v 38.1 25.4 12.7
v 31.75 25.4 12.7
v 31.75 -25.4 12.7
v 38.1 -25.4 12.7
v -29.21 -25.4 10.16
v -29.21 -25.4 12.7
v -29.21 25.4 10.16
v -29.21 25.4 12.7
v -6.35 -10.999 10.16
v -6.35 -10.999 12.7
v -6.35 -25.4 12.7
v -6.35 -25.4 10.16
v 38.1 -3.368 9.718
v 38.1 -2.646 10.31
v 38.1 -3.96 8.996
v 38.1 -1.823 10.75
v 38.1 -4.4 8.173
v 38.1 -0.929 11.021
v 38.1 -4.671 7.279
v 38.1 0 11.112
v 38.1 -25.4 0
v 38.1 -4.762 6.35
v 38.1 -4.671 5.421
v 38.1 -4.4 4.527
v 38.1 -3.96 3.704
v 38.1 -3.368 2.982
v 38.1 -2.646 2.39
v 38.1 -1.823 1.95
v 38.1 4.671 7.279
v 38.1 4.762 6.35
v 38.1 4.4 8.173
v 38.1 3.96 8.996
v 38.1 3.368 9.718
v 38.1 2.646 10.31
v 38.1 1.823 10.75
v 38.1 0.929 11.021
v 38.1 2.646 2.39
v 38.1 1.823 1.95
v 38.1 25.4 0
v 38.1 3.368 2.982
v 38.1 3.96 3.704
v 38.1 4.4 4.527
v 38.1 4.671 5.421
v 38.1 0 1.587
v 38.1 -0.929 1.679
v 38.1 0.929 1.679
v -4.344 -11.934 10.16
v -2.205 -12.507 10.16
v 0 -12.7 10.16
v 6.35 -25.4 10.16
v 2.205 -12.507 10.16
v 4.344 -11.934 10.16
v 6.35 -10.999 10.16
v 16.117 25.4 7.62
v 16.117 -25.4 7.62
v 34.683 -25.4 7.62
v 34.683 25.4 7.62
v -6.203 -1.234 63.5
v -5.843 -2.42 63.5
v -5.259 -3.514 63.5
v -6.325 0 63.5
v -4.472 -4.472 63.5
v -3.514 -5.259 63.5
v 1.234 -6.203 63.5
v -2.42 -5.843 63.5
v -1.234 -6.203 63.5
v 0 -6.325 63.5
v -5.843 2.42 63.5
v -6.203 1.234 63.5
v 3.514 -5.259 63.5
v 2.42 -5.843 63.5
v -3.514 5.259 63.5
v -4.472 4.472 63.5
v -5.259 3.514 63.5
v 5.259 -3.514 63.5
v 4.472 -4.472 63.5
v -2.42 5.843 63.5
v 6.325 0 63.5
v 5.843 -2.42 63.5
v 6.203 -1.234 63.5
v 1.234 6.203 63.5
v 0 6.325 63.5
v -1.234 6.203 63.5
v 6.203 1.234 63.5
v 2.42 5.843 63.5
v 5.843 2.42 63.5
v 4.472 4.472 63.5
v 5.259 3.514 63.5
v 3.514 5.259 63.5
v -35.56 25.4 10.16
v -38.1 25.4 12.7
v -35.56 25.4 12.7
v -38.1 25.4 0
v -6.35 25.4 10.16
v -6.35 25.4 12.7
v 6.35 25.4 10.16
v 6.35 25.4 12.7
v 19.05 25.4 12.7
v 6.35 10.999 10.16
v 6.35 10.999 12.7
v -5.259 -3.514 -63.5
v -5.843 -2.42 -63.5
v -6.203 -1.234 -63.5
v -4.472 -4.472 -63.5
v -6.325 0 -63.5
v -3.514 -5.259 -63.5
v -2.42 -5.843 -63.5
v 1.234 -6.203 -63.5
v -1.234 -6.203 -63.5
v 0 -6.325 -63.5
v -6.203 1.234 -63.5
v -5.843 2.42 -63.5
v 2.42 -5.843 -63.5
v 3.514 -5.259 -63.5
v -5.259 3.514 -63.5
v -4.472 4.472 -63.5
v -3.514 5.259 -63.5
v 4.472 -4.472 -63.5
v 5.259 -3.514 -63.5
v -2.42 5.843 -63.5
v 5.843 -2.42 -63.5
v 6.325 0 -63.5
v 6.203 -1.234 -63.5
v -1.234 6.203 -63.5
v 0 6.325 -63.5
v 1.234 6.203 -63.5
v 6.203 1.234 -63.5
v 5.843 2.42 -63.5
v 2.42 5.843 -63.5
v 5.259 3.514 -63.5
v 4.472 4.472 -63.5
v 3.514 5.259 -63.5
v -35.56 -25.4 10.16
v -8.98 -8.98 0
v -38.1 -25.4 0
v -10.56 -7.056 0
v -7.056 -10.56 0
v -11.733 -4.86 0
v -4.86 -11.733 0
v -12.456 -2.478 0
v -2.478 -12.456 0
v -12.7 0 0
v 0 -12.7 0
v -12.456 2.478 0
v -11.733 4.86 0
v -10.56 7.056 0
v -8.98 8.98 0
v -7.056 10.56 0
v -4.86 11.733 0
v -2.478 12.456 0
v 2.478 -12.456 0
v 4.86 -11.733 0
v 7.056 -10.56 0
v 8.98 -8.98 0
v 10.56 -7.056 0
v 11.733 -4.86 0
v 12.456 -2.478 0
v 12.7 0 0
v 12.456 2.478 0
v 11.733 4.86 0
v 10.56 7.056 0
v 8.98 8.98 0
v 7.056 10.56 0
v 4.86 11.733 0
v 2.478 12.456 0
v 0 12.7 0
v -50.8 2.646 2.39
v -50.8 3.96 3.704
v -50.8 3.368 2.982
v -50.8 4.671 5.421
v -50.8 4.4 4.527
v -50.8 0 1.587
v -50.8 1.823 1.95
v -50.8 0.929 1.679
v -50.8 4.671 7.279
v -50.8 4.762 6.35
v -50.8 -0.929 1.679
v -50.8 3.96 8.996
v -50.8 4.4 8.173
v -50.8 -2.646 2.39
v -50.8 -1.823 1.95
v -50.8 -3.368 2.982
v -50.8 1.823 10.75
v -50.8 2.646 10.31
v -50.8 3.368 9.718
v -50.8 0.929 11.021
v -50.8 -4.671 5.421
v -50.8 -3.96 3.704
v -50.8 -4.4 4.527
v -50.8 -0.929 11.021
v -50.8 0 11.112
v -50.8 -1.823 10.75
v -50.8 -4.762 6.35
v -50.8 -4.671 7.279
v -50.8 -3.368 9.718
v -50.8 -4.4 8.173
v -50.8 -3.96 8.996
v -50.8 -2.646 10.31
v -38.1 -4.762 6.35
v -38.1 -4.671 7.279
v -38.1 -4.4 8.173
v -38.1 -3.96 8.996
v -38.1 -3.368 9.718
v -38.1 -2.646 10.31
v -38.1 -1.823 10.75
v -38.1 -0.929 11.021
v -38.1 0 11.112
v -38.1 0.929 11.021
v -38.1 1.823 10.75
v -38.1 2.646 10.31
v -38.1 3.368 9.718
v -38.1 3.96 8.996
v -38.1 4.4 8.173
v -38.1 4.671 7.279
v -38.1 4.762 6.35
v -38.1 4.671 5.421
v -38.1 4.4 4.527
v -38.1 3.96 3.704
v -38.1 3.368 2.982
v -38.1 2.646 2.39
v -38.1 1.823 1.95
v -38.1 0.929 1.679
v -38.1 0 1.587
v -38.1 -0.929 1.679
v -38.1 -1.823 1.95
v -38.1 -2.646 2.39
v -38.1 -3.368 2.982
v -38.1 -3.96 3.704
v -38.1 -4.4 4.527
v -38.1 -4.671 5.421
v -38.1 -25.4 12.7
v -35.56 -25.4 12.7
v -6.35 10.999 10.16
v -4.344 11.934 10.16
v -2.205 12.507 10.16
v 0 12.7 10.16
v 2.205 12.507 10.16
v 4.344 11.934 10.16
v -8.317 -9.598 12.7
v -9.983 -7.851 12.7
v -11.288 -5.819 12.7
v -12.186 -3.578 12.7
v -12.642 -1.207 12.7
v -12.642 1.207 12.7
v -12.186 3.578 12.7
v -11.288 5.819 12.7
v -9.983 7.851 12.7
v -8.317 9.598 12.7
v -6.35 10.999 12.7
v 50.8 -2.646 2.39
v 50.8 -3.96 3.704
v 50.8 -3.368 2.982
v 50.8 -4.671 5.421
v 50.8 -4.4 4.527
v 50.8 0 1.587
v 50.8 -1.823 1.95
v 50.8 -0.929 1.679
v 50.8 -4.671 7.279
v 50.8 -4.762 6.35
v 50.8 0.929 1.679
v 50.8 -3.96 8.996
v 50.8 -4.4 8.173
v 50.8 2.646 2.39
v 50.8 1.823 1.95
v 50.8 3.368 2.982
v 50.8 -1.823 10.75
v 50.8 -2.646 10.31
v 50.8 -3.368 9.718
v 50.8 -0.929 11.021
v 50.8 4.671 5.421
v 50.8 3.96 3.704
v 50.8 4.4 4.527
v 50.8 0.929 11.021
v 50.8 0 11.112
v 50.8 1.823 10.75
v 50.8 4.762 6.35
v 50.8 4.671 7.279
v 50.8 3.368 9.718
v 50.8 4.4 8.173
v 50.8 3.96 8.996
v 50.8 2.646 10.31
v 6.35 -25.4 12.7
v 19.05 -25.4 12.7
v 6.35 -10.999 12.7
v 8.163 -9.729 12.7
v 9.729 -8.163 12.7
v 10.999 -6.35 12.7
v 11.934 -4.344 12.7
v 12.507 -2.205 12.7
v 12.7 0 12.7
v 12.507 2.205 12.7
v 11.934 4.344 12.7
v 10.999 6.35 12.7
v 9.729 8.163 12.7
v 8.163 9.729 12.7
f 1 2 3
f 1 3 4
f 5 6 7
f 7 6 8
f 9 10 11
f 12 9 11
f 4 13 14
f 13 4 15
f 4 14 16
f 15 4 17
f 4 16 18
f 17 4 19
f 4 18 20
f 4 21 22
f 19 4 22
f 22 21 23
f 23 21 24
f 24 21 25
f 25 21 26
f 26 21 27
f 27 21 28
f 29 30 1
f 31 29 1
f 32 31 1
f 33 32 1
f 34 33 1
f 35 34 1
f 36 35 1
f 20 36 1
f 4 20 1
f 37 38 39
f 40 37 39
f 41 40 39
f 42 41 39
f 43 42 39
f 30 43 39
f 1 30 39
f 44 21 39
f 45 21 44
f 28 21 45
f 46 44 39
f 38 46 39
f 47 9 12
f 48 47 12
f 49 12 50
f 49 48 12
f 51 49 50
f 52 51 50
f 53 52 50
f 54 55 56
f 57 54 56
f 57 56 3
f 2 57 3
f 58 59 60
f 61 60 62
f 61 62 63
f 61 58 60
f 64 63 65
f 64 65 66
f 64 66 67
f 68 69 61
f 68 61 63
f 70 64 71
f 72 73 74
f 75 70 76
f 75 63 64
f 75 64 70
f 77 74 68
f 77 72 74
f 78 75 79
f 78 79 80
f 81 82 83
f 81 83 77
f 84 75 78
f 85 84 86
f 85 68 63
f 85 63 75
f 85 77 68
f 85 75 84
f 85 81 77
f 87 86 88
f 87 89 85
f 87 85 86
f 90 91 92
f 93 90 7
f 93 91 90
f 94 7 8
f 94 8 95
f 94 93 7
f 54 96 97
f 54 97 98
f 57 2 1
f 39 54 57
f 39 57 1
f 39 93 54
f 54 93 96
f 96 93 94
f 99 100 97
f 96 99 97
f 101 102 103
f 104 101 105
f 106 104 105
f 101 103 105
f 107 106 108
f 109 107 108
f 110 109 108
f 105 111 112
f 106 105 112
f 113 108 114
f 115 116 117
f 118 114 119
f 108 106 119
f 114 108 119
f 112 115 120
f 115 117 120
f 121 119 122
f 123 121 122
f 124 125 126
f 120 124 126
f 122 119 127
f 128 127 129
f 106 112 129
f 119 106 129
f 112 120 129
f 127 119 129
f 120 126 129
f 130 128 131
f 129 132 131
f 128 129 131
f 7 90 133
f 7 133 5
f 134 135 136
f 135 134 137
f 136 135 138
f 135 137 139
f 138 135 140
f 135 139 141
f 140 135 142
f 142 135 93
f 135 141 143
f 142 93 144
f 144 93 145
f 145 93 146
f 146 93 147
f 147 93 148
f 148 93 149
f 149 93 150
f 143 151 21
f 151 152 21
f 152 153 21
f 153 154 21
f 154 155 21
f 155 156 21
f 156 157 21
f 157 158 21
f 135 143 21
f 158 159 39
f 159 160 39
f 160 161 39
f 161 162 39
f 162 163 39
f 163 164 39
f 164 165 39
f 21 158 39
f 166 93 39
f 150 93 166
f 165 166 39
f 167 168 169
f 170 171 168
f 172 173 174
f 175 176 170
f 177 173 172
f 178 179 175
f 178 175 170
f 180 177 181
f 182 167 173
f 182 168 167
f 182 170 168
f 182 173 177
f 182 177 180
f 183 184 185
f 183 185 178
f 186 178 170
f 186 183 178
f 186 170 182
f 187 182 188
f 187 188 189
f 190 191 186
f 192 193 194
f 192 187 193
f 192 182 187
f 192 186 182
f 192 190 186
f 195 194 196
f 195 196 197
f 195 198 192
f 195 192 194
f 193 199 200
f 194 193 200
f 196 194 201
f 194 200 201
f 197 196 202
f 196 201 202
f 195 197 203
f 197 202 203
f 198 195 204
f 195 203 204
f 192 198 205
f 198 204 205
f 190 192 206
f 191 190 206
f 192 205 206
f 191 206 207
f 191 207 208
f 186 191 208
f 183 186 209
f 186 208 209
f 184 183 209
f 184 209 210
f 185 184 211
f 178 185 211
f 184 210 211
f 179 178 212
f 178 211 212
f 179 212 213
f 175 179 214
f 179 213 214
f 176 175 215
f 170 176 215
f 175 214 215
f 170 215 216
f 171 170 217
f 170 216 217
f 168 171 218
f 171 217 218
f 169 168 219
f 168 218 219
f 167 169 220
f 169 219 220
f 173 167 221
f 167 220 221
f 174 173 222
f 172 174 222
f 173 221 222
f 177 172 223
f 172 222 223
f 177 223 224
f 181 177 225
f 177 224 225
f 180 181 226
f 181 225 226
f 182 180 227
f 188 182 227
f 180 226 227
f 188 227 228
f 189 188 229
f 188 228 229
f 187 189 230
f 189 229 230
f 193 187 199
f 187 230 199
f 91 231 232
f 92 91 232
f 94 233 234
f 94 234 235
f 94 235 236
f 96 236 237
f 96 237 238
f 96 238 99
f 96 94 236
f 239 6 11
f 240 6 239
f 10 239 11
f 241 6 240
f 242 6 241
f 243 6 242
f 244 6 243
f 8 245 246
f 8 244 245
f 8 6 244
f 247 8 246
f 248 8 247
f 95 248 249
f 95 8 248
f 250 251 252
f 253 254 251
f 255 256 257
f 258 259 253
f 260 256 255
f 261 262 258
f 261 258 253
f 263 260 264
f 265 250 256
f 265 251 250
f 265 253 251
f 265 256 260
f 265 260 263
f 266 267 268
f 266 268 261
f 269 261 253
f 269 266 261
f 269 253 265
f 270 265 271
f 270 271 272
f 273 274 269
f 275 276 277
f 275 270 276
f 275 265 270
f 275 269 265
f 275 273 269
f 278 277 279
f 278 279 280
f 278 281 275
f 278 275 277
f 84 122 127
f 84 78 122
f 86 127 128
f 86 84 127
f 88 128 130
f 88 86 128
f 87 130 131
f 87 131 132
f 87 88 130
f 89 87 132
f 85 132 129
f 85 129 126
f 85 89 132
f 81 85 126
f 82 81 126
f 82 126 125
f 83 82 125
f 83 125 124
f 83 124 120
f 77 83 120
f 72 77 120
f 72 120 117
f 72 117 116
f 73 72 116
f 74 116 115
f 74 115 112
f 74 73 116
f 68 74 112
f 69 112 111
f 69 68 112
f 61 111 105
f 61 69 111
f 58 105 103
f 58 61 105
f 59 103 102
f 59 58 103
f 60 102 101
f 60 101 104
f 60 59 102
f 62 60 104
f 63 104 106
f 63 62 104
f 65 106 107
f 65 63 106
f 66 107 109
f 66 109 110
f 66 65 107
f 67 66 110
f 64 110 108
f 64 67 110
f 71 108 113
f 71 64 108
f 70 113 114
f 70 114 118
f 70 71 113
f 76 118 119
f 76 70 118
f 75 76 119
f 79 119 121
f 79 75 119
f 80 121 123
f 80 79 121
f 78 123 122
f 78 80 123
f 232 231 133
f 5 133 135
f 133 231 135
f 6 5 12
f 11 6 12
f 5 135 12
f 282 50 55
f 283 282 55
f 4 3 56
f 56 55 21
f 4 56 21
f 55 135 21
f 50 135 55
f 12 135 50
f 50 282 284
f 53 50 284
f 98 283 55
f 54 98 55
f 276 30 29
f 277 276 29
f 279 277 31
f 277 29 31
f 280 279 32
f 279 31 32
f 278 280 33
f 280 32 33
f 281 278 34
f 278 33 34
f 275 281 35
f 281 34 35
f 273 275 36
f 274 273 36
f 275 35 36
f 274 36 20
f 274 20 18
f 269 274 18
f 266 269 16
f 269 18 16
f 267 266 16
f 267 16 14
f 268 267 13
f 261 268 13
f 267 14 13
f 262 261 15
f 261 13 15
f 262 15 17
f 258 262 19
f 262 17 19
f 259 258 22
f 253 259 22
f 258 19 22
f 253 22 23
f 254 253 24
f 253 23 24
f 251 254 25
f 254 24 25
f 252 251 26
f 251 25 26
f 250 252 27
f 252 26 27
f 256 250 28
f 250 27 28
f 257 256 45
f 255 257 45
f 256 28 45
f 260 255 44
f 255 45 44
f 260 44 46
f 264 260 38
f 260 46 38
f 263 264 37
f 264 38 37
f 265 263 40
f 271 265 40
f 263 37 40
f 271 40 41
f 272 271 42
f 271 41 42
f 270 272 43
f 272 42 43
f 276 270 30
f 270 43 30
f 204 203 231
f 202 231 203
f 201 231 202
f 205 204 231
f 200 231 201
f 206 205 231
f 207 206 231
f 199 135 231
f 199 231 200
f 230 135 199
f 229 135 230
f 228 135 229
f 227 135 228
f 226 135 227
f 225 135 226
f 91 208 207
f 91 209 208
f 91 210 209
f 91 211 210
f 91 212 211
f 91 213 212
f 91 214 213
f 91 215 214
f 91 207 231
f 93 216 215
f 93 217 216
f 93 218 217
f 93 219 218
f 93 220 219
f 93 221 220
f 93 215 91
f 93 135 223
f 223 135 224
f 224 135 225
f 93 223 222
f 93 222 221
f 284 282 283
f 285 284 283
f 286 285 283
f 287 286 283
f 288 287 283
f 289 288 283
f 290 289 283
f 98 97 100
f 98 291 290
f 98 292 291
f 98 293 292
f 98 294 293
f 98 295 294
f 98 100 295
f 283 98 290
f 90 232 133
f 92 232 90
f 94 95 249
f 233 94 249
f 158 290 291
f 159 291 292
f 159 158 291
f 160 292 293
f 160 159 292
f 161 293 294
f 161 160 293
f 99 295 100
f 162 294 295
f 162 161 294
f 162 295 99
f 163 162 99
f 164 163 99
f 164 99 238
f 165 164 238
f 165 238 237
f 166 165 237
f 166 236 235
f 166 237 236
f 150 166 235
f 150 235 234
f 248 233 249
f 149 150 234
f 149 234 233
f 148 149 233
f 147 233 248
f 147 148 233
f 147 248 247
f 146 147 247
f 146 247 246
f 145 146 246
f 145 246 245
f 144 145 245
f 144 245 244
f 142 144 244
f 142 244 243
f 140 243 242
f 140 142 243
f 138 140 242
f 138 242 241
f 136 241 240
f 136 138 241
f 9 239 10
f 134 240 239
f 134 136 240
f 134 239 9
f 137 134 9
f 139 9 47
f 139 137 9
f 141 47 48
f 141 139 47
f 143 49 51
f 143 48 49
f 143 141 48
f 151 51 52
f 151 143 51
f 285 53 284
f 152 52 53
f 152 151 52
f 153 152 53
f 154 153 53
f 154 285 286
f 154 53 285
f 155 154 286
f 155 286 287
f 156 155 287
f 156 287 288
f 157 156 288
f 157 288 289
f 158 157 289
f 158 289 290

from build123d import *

# Parameters (mm, degrees)
F0_W      = 76.2
F0_H      = 50.8
F0_R      = 12.7
F1_DEPTH  = 12.7
F2_W      = 6.35
F2_H      = 50.8
F3_DEPTH  = 2.54
F5_DEPTH  = 50.801
F6_R      = 4.7625
F7_DEPTH  = 12.7
F8_R      = 6.3247937965
F9_DEPTH  = 63.5
F10_R     = 4.7625
F11_DEPTH = 12.7


with BuildPart() as f1:
    # F0 (on Top) → F1 (new body)
    with BuildSketch(Plane.XY):
        Rectangle(F0_W, F0_H)
        Circle(F0_R, mode=Mode.SUBTRACT)
    extrude(amount=F1_DEPTH)

    # F2 (on face) → F3 (cut)
    with BuildSketch(Plane.XY.offset(12.7)):
        with Locations((-32.385, 0)):
            Rectangle(F2_W, F2_H)
        with BuildLine():
            Line((6.35, 25.4), (-6.35, 25.4))
            Line((-6.35, 25.4), (-6.35, 10.9985226281))
            ThreePointArc((-6.35, 10.9985226281), (0, 12.7), (6.35, 10.9985226281))
            Line((6.35, 10.9985226281), (6.35, 25.4))
        make_face()
        with BuildLine():
            Line((-6.35, -10.9985226281), (-6.35, -25.4))
            Line((-6.35, -25.4), (6.35, -25.4))
            Line((6.35, -25.4), (6.35, -10.9985226281))
            ThreePointArc((6.35, -10.9985226281), (0, -12.7), (-6.35, -10.9985226281))
        make_face()
    extrude(amount=-F3_DEPTH, mode=Mode.SUBTRACT)

    # F4 (on face) → F5 (cut, through all)
    with BuildSketch(Plane.XZ.offset(25.4)):
        Polygon((31.75, 12.7), (19.05, 12.7), (16.1170606325, 7.62), (34.6829393675, 7.62), align=None)
    extrude(amount=-F5_DEPTH, mode=Mode.SUBTRACT)

    # F6 (on face) → F7 (join)
    with BuildSketch(Plane.YZ.offset(38.1)):
        with Locations((0, 6.35)):
            Circle(F6_R)
    extrude(amount=F7_DEPTH)

    # F10 (on face) → F11 (join)
    with BuildSketch(Plane(origin=(-38.1, 0, 0), x_dir=(0, -1, 0), z_dir=(-1, 0, 0))):
        with Locations((0, 6.35)):
            Circle(F10_R)
    extrude(amount=F11_DEPTH)


with BuildPart() as f9:
    # F8 (on Top) → F9 (new body, symmetric)
    with BuildSketch(Plane.XY):
        Circle(F8_R)
    extrude(amount=F9_DEPTH, both=True)


solid = Compound([f1.part, f9.part])
